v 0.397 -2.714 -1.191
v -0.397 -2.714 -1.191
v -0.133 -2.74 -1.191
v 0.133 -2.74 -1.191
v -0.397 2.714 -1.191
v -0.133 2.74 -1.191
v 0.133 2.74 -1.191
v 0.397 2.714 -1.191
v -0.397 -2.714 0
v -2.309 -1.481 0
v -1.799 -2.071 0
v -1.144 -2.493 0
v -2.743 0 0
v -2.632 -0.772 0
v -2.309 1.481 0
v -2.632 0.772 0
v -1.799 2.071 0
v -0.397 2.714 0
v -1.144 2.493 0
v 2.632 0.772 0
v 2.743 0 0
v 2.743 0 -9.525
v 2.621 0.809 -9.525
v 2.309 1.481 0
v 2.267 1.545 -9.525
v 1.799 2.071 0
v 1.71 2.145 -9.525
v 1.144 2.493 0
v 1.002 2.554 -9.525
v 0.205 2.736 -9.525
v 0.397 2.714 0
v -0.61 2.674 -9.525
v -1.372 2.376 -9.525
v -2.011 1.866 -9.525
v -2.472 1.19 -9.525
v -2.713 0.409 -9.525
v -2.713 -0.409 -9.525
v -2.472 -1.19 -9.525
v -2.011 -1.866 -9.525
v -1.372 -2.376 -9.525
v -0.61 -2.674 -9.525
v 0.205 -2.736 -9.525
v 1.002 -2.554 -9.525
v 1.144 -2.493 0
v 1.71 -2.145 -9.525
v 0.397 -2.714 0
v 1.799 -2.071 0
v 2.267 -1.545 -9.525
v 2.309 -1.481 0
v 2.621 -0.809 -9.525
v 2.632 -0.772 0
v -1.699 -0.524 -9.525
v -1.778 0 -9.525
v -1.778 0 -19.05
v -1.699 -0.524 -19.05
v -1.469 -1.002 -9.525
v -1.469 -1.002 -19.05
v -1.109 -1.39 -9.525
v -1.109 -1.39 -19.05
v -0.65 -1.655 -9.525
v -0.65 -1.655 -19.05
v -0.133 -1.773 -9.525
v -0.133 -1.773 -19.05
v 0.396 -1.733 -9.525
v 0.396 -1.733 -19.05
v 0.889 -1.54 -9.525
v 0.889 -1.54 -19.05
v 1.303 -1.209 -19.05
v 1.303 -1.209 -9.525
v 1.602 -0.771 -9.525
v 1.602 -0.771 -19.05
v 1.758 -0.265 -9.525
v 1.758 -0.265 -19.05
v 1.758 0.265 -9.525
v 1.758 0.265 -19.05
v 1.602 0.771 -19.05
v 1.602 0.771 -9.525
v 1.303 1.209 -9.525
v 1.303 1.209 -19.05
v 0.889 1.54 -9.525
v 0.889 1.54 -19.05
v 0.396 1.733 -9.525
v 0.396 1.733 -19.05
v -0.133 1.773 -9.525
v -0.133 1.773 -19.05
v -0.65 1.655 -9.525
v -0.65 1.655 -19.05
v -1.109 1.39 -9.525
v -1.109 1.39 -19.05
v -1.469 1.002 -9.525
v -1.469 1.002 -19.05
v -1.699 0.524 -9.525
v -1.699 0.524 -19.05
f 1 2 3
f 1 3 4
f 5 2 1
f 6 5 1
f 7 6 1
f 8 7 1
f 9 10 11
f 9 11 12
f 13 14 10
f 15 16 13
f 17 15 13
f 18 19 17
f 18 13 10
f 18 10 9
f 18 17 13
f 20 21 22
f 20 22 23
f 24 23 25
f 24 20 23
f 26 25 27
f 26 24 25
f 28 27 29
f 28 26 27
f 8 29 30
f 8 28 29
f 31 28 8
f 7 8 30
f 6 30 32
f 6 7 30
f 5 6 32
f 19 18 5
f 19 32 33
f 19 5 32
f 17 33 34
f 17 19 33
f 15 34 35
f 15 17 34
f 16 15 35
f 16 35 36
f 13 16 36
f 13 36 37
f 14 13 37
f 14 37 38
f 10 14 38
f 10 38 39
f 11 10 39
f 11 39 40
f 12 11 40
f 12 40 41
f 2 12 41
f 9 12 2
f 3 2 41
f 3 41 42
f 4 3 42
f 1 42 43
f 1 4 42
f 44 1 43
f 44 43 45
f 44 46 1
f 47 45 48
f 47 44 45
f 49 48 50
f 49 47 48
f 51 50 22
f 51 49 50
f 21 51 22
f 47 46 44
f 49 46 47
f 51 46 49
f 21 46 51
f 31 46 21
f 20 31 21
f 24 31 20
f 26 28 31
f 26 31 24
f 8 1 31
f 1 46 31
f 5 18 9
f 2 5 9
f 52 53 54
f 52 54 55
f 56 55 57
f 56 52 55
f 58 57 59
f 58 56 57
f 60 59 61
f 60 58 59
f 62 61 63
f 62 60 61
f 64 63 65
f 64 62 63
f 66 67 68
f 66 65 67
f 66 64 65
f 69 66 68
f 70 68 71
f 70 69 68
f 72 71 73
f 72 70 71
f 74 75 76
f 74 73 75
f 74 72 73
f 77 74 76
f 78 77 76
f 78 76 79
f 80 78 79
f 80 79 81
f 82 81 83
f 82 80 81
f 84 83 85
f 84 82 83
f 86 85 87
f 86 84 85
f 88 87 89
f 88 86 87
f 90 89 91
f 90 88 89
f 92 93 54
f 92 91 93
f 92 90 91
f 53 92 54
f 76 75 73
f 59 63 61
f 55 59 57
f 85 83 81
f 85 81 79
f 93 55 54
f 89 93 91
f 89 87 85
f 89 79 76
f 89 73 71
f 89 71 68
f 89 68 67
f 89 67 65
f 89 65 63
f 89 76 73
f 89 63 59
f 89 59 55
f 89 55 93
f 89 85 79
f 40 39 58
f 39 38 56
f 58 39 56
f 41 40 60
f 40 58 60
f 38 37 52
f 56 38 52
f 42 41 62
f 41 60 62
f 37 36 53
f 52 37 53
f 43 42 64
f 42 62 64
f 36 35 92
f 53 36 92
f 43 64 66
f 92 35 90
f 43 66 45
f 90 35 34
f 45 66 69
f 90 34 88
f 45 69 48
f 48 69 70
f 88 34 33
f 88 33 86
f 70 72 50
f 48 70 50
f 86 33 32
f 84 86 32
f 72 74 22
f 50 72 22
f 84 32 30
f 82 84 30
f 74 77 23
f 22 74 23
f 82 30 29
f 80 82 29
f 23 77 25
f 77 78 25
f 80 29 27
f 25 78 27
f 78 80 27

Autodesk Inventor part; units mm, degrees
ref_plane "YZ Plane" through (0, 0, 0) normal (1, 0, 0) x (0, 1, 0)
ref_plane "XZ Plane" through (0, 0, 0) normal (0, 1, 0) x (-1, 0, 0)
ref_plane "XY Plane" through (0, 0, 0) normal (0, 0, 1) x (1, 0, 0)
sketch "Sketch1" plane through (0, 0, 0) normal (0, 0, 1) x (1, 0, 0)
  circle A0 centre (0, 0) radius 2.7432
  dimension "d0" = 5.4864
extrude "Extrusion1" add sketch "Sketch1" against normal blind 9.525
sketch "Sketch2" plane through (0, 0, -9.525) normal (0, 0, -1) x (-1, 0, 0)
  circle A0 centre (0, 0) radius 2.7432 projected
  circle A1 centre (0, 0) radius 1.778
  dimension "d3" = 3.556
extrude "Extrusion2" add sketch "Sketch2" along normal blind 9.525 contours A1
thread "Thread1" size "12-24 UNC" class "2A" standard "ANSI Unified Screw Threads" full length
sketch "Sketch3" plane through (0, 0, 0) normal (0, 0, 1) x (1, 0, 0)
  circle A0 centre (0, 0) radius 2.7432 projected
  line L0 (-0.3969, 2.7143) -> (-0.3969, -2.7143)
  line L1 (0.3969, -2.7143) -> (0.3969, 2.7143)
  dimension "d8" = 0.7937
  dimension "d9" = 0.3969
extrude "Extrusion3" cut sketch "Sketch3" against normal blind 1.1906 contours L1 A0 L0
equation "\"d9\" = 0.5 * d8"
properties part number "Set_Screw" material "Steel, Mild"
